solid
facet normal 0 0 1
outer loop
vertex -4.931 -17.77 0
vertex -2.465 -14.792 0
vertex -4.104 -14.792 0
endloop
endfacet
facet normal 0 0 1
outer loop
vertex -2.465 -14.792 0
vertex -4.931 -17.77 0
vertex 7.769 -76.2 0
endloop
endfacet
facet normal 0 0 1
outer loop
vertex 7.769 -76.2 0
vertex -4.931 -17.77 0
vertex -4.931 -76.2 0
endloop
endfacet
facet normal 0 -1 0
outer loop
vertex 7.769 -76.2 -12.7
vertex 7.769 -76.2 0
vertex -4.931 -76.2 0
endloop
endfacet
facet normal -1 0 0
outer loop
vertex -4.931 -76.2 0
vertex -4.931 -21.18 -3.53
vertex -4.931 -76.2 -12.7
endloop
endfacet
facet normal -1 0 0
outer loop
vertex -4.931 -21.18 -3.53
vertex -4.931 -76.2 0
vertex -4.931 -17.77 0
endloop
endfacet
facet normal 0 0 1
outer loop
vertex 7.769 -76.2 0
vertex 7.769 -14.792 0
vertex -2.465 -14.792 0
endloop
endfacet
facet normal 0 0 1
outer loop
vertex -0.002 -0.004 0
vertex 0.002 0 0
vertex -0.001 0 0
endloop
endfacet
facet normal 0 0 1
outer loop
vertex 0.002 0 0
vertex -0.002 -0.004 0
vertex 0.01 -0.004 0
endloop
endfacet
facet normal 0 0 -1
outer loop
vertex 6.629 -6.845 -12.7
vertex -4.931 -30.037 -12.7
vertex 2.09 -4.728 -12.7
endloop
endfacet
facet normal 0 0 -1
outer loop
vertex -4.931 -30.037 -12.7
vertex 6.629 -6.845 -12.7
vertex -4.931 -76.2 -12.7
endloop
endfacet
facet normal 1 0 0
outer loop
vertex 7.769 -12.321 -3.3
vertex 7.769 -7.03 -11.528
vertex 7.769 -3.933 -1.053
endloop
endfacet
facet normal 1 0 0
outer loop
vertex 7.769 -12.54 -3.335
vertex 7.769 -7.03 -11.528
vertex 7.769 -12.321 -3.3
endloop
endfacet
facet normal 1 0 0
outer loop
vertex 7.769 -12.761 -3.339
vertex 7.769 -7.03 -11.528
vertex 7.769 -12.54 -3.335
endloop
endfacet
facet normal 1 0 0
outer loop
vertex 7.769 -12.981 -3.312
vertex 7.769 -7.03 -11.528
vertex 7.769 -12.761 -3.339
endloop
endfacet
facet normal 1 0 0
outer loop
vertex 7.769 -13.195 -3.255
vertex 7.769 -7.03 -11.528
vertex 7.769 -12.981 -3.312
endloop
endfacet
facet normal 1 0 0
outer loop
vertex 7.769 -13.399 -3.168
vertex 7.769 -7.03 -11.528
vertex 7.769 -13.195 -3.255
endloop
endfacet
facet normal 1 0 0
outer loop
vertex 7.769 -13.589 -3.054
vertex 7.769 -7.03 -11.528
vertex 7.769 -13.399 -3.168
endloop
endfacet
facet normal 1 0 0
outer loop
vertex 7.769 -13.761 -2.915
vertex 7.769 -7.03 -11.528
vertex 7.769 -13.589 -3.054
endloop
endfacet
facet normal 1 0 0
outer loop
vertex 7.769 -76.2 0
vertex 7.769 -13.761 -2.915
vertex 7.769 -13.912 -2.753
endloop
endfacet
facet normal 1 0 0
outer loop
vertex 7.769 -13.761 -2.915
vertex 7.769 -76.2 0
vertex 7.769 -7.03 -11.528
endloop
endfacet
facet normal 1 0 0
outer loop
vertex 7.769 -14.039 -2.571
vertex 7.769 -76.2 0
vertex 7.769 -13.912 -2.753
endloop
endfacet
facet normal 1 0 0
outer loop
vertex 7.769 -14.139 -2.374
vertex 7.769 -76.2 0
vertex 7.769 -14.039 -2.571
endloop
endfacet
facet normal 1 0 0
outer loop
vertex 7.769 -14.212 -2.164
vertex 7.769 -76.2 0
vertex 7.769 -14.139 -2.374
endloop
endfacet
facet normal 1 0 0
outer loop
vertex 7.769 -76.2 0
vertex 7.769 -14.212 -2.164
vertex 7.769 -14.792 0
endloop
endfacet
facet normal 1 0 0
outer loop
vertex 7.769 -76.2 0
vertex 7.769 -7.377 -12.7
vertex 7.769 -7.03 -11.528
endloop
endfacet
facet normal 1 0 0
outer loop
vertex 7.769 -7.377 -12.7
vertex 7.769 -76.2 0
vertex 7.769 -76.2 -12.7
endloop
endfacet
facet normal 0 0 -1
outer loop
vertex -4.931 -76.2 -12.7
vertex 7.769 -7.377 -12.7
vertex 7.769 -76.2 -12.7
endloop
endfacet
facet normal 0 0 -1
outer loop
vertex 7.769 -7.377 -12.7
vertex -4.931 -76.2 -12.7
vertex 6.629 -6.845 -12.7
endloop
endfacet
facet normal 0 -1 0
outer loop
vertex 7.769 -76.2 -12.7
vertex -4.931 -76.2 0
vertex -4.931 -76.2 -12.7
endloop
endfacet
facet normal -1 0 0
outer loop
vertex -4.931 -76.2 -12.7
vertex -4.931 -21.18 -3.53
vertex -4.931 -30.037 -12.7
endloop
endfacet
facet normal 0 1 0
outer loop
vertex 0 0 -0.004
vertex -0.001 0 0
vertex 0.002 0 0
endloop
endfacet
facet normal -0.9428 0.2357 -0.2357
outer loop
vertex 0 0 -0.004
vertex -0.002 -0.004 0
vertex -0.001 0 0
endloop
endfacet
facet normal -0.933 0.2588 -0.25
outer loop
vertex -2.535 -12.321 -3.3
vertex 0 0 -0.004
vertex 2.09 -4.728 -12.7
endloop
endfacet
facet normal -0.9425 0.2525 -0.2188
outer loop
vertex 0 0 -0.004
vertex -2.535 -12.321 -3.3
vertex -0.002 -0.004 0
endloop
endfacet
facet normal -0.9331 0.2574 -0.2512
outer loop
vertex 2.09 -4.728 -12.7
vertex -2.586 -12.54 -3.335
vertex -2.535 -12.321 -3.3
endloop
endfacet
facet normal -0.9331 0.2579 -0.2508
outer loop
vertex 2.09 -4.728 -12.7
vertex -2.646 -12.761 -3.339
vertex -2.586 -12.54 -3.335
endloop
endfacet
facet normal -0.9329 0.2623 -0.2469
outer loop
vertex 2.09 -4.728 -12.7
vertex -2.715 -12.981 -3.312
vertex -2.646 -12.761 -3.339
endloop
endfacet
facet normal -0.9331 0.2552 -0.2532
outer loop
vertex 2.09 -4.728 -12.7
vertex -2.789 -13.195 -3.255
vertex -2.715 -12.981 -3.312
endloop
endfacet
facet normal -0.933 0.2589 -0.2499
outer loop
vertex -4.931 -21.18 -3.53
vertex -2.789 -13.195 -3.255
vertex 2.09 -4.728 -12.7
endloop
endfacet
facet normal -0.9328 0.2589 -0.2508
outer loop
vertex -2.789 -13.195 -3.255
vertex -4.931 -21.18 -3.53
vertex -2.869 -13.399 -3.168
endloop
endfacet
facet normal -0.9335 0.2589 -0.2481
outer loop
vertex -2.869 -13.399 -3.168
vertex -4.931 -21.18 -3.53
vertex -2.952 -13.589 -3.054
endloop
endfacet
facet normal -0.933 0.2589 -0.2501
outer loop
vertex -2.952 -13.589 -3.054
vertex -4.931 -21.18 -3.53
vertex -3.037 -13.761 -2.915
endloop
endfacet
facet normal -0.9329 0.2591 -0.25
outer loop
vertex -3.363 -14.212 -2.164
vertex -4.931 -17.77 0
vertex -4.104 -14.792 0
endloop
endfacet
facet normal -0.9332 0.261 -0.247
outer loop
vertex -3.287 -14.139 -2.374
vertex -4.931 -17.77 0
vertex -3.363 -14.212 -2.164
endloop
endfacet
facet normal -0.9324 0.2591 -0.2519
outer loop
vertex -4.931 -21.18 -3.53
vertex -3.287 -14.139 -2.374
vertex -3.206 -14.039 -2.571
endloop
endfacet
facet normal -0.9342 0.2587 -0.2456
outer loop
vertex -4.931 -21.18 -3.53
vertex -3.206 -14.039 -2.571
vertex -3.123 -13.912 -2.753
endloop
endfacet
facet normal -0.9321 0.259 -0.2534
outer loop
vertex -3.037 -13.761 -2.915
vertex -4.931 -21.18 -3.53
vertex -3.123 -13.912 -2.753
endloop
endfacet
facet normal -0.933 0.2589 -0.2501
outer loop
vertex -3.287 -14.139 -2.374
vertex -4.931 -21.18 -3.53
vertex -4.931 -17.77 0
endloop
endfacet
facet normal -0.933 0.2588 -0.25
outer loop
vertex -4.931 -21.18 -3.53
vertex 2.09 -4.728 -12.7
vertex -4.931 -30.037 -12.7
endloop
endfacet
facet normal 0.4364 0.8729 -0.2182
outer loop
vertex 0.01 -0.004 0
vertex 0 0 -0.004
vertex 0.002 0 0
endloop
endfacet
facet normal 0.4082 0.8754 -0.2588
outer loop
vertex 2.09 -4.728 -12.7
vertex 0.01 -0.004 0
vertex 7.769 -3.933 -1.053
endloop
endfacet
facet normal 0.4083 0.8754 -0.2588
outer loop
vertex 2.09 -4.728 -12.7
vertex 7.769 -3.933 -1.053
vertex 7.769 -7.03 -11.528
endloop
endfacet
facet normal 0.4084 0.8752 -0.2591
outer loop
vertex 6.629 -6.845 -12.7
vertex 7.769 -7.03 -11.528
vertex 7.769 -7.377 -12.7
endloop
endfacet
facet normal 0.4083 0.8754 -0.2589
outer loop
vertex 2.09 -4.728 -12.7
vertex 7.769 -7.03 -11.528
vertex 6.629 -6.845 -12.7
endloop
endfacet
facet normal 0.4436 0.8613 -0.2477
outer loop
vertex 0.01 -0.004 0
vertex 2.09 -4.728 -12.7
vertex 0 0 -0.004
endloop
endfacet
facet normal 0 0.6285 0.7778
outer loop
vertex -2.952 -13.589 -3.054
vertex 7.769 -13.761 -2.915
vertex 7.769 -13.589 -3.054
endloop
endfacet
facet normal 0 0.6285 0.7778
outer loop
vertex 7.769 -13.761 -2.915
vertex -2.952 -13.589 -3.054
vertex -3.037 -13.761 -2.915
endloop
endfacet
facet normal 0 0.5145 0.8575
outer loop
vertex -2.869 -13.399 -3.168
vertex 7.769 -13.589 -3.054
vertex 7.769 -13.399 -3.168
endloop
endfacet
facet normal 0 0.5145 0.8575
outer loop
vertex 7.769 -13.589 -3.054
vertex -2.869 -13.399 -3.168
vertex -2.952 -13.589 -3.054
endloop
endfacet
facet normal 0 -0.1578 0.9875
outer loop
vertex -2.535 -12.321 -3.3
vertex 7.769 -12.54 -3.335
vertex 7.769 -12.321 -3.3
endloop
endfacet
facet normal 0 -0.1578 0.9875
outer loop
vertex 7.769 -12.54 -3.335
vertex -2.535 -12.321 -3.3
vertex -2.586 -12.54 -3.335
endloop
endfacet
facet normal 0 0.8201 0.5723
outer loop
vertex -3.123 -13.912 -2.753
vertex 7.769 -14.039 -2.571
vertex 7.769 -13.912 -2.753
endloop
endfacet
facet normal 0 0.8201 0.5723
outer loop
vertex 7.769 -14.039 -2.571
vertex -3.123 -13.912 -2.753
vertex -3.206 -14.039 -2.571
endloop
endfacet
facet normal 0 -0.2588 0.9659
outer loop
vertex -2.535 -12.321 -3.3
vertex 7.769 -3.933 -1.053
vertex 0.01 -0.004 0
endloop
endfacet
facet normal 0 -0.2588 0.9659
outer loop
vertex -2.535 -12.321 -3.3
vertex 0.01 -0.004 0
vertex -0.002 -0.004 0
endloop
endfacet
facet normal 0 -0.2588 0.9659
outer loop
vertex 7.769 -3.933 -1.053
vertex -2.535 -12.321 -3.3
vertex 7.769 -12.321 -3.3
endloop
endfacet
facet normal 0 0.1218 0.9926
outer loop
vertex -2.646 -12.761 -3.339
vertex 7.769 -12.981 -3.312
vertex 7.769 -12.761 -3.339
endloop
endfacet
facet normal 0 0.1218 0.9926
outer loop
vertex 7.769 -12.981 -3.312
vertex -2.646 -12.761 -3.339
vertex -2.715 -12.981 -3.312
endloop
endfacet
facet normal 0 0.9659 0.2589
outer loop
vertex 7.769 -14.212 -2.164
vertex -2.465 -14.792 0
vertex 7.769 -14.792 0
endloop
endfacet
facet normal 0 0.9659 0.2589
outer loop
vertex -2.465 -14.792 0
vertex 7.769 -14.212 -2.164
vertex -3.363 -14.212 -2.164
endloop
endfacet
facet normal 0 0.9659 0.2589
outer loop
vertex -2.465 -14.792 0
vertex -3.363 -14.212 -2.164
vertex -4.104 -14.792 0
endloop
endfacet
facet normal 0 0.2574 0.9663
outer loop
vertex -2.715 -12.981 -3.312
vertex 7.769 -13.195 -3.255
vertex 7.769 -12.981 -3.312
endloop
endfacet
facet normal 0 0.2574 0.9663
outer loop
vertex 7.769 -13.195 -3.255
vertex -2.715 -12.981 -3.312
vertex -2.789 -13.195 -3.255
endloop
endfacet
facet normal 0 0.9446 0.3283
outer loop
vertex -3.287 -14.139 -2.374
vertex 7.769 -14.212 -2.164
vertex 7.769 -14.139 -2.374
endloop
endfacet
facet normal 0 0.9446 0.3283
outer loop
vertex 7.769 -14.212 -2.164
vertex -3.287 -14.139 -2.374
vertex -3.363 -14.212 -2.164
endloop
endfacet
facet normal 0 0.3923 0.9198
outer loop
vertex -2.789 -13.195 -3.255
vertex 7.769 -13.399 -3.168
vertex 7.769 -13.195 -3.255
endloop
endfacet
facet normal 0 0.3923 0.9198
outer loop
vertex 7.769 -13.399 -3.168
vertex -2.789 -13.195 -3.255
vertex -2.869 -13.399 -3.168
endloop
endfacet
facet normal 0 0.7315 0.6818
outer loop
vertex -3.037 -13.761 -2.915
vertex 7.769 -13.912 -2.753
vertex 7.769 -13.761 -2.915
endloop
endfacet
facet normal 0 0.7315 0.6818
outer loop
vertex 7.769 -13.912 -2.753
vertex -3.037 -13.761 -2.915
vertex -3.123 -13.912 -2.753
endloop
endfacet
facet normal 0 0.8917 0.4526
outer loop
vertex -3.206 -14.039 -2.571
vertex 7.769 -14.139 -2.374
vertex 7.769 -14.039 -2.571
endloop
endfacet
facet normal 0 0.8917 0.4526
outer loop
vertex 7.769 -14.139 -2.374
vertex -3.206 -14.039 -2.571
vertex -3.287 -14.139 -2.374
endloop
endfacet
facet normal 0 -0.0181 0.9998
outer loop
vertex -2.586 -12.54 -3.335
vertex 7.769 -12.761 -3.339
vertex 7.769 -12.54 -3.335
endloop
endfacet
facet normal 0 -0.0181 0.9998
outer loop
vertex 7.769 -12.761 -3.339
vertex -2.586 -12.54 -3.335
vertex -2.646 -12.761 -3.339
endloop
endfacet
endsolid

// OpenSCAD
// Copyright 2019 Michael K Johnson
// Use allowed under Attribution 4.0 International (CC BY 4.0) license terms
// https://creativecommons.org/licenses/by/4.0/legalcode
// Model of Mikey's Square Tool
// https://www.hobby-machinist.com/threads/models-for-grinding-hss-lathe-tools.62111/
// Scale 200-500% for printing, reducing length, to see closely
// All parameters are in inches, because that's common use
// https://me-mechanicalengineering.com/single-point-cutting-tool/ has definitions

// Stock is assumed to be square in cross section
stock_width = 0.5;
// Typical stock is 3-6 inches long; can reduce to print enlarged models to concentrate on shape of tip
stock_len = 3;
// To model the curve from the wheel; 6" and 8" are common
wheel_diameter = 8;
// Wheel or platen thickness; matters only if using this for visualizations
wheel_thickness = 1;
// Radius of the edge of the wheel/platen; shows at back edge of top cut
wheel_edge_radius = .0625;
// Common radii are .0156 (1/64") .03125 (1/32") .0625 (1/16") (Nose radius currently ignored)
nose_radius = .0156; // 1/64
// Side Cutting Edge Angle (SCEA)
side_cutting_edge_angle = 15;
// End Cutting Edge Angle (ECEA) is derived from the included angle of the tip, and is normally less than 90
tip_included_angle = 80;
// Back Rake (BR) 
back_rake_angle = 15;
// Side Rake (SR)
side_rake_angle = 15;
// Side Relief
side_relief_angle = 15;
// End Relief ("Clearance")
end_relief_angle = 15;
// How far back the top of the tool the side cut extends, relative to the width of the stock; typically between 1 and 2
side_edge_aspect_ratio = 1.5;
// use_platen: true for belt grinder platen, false for wheel grinder
use_platen = true;

/* [Hidden] */

// true to use simple shapes for fast rendering while developing; false for more accurate shapes for final renders
fast_render = false;

function mm(inches) = inches * 25.4;

stock_w = mm(stock_width);
stock_l = mm(stock_len);
wheel_r = mm(wheel_diameter) / 2;
wheel_t = mm(wheel_thickness);
wheel_e_r = mm(wheel_edge_radius);
nose_r = mm(nose_radius);

// Logical pre-rounded tip located at -pivot_offset
pivot_offset = -mm(side_edge_aspect_ratio * stock_width) * sin(side_cutting_edge_angle);
echo (pivot_offset);

module smooth_wheel(r=wheel_r, t=wheel_t) {
    x = t/2 - wheel_e_r;
    y = r - mm(0.5);
    translate([0, r, 0])
    rotate([0, 90, 0])
    rotate_extrude($fa=1)
    rotate([0, 0, 90])
    translate([0, -(r-wheel_e_r), 0])
    hull() {
        translate([x, 0, 0]) circle(r=wheel_e_r, $fn=45);
        translate([-x, 0, 0]) circle(r=wheel_e_r, $fn=45);
        translate([x, y, 0]) circle(r=wheel_e_r, $fn=45);
        translate([-x, y, 0]) circle(r=wheel_e_r, $fn=45);
    }
}
module wheel(r=wheel_r, t=wheel_t) {
    z = -stock_w/2; // honed angles at edges will be as set
    // simple cylinder
    if (fast_render) {
        translate([-t/2, r, z]) rotate([90, 0, 90])
        cylinder(r=r, h=t, $fa=1);
    } else {
        smooth_wheel(r, t);
    }
}
module platen(h=wheel_r, t=wheel_t) {
    hull() {
        // front of platen
        translate([t/2, wheel_e_r, -h/2])
            cylinder(r=wheel_e_r, h=h, $fn=45);
        translate([-t/2, wheel_e_r, -h/2])
            cylinder(r=wheel_e_r, h=h, $fn=45);
        // extend it back to represent what will be cut out
        translate([t/2, t, -h/2])
            cylinder(r=wheel_e_r, h=h, $fn=45);
        translate([-t/2, t, -h/2])
            cylinder(r=wheel_e_r, h=h, $fn=45);
    }
}
module surface(t=wheel_t) {
    if (use_platen) {
        platen(t=t);
    } else {
        wheel(t=t);
    }
}
module stock(w=stock_w, l=stock_l) {
    // origin is pivot point for cuts, oriented to be like using a wheel
    translate([pivot_offset, -l, -w])
        cube([w, l, w]);
}
module side_cut() {
    z = 90-side_cutting_edge_angle;
    rotate([0, -side_relief_angle, 0])
    rotate([0, 0, z])
    difference() {
        rotate([0, 0, -z])
        rotate([0, side_relief_angle, 0])
            stock();
        surface(t=wheel_t*10); // "infinite" wheel, move stock
    }
}
module end_cut() {
    z = (90-tip_included_angle)+side_cutting_edge_angle;
    rotate([0, 0, -z])
    rotate([-end_relief_angle, 0, 0])
    difference() {
        rotate([end_relief_angle, 0, 0])
        rotate([0, 0, z])
            side_cut();
        surface();
    }
}
module nose_radius() {
    // There is no chamfer function to follow the
    // the sharp edge with a clean curve
    // Should find a way to sufficiently approximate
    end_cut();
}
module top_cut() {
    z = 90 + back_rake_angle;
    rotate([0, -90, 0])
    rotate([0, 0, -z])
    difference() {
        rotate([0, 0, z])
        rotate([0, 90, 0])
            nose_radius();
        surface();
    }
}
//wheel();
//platen();
top_cut();
